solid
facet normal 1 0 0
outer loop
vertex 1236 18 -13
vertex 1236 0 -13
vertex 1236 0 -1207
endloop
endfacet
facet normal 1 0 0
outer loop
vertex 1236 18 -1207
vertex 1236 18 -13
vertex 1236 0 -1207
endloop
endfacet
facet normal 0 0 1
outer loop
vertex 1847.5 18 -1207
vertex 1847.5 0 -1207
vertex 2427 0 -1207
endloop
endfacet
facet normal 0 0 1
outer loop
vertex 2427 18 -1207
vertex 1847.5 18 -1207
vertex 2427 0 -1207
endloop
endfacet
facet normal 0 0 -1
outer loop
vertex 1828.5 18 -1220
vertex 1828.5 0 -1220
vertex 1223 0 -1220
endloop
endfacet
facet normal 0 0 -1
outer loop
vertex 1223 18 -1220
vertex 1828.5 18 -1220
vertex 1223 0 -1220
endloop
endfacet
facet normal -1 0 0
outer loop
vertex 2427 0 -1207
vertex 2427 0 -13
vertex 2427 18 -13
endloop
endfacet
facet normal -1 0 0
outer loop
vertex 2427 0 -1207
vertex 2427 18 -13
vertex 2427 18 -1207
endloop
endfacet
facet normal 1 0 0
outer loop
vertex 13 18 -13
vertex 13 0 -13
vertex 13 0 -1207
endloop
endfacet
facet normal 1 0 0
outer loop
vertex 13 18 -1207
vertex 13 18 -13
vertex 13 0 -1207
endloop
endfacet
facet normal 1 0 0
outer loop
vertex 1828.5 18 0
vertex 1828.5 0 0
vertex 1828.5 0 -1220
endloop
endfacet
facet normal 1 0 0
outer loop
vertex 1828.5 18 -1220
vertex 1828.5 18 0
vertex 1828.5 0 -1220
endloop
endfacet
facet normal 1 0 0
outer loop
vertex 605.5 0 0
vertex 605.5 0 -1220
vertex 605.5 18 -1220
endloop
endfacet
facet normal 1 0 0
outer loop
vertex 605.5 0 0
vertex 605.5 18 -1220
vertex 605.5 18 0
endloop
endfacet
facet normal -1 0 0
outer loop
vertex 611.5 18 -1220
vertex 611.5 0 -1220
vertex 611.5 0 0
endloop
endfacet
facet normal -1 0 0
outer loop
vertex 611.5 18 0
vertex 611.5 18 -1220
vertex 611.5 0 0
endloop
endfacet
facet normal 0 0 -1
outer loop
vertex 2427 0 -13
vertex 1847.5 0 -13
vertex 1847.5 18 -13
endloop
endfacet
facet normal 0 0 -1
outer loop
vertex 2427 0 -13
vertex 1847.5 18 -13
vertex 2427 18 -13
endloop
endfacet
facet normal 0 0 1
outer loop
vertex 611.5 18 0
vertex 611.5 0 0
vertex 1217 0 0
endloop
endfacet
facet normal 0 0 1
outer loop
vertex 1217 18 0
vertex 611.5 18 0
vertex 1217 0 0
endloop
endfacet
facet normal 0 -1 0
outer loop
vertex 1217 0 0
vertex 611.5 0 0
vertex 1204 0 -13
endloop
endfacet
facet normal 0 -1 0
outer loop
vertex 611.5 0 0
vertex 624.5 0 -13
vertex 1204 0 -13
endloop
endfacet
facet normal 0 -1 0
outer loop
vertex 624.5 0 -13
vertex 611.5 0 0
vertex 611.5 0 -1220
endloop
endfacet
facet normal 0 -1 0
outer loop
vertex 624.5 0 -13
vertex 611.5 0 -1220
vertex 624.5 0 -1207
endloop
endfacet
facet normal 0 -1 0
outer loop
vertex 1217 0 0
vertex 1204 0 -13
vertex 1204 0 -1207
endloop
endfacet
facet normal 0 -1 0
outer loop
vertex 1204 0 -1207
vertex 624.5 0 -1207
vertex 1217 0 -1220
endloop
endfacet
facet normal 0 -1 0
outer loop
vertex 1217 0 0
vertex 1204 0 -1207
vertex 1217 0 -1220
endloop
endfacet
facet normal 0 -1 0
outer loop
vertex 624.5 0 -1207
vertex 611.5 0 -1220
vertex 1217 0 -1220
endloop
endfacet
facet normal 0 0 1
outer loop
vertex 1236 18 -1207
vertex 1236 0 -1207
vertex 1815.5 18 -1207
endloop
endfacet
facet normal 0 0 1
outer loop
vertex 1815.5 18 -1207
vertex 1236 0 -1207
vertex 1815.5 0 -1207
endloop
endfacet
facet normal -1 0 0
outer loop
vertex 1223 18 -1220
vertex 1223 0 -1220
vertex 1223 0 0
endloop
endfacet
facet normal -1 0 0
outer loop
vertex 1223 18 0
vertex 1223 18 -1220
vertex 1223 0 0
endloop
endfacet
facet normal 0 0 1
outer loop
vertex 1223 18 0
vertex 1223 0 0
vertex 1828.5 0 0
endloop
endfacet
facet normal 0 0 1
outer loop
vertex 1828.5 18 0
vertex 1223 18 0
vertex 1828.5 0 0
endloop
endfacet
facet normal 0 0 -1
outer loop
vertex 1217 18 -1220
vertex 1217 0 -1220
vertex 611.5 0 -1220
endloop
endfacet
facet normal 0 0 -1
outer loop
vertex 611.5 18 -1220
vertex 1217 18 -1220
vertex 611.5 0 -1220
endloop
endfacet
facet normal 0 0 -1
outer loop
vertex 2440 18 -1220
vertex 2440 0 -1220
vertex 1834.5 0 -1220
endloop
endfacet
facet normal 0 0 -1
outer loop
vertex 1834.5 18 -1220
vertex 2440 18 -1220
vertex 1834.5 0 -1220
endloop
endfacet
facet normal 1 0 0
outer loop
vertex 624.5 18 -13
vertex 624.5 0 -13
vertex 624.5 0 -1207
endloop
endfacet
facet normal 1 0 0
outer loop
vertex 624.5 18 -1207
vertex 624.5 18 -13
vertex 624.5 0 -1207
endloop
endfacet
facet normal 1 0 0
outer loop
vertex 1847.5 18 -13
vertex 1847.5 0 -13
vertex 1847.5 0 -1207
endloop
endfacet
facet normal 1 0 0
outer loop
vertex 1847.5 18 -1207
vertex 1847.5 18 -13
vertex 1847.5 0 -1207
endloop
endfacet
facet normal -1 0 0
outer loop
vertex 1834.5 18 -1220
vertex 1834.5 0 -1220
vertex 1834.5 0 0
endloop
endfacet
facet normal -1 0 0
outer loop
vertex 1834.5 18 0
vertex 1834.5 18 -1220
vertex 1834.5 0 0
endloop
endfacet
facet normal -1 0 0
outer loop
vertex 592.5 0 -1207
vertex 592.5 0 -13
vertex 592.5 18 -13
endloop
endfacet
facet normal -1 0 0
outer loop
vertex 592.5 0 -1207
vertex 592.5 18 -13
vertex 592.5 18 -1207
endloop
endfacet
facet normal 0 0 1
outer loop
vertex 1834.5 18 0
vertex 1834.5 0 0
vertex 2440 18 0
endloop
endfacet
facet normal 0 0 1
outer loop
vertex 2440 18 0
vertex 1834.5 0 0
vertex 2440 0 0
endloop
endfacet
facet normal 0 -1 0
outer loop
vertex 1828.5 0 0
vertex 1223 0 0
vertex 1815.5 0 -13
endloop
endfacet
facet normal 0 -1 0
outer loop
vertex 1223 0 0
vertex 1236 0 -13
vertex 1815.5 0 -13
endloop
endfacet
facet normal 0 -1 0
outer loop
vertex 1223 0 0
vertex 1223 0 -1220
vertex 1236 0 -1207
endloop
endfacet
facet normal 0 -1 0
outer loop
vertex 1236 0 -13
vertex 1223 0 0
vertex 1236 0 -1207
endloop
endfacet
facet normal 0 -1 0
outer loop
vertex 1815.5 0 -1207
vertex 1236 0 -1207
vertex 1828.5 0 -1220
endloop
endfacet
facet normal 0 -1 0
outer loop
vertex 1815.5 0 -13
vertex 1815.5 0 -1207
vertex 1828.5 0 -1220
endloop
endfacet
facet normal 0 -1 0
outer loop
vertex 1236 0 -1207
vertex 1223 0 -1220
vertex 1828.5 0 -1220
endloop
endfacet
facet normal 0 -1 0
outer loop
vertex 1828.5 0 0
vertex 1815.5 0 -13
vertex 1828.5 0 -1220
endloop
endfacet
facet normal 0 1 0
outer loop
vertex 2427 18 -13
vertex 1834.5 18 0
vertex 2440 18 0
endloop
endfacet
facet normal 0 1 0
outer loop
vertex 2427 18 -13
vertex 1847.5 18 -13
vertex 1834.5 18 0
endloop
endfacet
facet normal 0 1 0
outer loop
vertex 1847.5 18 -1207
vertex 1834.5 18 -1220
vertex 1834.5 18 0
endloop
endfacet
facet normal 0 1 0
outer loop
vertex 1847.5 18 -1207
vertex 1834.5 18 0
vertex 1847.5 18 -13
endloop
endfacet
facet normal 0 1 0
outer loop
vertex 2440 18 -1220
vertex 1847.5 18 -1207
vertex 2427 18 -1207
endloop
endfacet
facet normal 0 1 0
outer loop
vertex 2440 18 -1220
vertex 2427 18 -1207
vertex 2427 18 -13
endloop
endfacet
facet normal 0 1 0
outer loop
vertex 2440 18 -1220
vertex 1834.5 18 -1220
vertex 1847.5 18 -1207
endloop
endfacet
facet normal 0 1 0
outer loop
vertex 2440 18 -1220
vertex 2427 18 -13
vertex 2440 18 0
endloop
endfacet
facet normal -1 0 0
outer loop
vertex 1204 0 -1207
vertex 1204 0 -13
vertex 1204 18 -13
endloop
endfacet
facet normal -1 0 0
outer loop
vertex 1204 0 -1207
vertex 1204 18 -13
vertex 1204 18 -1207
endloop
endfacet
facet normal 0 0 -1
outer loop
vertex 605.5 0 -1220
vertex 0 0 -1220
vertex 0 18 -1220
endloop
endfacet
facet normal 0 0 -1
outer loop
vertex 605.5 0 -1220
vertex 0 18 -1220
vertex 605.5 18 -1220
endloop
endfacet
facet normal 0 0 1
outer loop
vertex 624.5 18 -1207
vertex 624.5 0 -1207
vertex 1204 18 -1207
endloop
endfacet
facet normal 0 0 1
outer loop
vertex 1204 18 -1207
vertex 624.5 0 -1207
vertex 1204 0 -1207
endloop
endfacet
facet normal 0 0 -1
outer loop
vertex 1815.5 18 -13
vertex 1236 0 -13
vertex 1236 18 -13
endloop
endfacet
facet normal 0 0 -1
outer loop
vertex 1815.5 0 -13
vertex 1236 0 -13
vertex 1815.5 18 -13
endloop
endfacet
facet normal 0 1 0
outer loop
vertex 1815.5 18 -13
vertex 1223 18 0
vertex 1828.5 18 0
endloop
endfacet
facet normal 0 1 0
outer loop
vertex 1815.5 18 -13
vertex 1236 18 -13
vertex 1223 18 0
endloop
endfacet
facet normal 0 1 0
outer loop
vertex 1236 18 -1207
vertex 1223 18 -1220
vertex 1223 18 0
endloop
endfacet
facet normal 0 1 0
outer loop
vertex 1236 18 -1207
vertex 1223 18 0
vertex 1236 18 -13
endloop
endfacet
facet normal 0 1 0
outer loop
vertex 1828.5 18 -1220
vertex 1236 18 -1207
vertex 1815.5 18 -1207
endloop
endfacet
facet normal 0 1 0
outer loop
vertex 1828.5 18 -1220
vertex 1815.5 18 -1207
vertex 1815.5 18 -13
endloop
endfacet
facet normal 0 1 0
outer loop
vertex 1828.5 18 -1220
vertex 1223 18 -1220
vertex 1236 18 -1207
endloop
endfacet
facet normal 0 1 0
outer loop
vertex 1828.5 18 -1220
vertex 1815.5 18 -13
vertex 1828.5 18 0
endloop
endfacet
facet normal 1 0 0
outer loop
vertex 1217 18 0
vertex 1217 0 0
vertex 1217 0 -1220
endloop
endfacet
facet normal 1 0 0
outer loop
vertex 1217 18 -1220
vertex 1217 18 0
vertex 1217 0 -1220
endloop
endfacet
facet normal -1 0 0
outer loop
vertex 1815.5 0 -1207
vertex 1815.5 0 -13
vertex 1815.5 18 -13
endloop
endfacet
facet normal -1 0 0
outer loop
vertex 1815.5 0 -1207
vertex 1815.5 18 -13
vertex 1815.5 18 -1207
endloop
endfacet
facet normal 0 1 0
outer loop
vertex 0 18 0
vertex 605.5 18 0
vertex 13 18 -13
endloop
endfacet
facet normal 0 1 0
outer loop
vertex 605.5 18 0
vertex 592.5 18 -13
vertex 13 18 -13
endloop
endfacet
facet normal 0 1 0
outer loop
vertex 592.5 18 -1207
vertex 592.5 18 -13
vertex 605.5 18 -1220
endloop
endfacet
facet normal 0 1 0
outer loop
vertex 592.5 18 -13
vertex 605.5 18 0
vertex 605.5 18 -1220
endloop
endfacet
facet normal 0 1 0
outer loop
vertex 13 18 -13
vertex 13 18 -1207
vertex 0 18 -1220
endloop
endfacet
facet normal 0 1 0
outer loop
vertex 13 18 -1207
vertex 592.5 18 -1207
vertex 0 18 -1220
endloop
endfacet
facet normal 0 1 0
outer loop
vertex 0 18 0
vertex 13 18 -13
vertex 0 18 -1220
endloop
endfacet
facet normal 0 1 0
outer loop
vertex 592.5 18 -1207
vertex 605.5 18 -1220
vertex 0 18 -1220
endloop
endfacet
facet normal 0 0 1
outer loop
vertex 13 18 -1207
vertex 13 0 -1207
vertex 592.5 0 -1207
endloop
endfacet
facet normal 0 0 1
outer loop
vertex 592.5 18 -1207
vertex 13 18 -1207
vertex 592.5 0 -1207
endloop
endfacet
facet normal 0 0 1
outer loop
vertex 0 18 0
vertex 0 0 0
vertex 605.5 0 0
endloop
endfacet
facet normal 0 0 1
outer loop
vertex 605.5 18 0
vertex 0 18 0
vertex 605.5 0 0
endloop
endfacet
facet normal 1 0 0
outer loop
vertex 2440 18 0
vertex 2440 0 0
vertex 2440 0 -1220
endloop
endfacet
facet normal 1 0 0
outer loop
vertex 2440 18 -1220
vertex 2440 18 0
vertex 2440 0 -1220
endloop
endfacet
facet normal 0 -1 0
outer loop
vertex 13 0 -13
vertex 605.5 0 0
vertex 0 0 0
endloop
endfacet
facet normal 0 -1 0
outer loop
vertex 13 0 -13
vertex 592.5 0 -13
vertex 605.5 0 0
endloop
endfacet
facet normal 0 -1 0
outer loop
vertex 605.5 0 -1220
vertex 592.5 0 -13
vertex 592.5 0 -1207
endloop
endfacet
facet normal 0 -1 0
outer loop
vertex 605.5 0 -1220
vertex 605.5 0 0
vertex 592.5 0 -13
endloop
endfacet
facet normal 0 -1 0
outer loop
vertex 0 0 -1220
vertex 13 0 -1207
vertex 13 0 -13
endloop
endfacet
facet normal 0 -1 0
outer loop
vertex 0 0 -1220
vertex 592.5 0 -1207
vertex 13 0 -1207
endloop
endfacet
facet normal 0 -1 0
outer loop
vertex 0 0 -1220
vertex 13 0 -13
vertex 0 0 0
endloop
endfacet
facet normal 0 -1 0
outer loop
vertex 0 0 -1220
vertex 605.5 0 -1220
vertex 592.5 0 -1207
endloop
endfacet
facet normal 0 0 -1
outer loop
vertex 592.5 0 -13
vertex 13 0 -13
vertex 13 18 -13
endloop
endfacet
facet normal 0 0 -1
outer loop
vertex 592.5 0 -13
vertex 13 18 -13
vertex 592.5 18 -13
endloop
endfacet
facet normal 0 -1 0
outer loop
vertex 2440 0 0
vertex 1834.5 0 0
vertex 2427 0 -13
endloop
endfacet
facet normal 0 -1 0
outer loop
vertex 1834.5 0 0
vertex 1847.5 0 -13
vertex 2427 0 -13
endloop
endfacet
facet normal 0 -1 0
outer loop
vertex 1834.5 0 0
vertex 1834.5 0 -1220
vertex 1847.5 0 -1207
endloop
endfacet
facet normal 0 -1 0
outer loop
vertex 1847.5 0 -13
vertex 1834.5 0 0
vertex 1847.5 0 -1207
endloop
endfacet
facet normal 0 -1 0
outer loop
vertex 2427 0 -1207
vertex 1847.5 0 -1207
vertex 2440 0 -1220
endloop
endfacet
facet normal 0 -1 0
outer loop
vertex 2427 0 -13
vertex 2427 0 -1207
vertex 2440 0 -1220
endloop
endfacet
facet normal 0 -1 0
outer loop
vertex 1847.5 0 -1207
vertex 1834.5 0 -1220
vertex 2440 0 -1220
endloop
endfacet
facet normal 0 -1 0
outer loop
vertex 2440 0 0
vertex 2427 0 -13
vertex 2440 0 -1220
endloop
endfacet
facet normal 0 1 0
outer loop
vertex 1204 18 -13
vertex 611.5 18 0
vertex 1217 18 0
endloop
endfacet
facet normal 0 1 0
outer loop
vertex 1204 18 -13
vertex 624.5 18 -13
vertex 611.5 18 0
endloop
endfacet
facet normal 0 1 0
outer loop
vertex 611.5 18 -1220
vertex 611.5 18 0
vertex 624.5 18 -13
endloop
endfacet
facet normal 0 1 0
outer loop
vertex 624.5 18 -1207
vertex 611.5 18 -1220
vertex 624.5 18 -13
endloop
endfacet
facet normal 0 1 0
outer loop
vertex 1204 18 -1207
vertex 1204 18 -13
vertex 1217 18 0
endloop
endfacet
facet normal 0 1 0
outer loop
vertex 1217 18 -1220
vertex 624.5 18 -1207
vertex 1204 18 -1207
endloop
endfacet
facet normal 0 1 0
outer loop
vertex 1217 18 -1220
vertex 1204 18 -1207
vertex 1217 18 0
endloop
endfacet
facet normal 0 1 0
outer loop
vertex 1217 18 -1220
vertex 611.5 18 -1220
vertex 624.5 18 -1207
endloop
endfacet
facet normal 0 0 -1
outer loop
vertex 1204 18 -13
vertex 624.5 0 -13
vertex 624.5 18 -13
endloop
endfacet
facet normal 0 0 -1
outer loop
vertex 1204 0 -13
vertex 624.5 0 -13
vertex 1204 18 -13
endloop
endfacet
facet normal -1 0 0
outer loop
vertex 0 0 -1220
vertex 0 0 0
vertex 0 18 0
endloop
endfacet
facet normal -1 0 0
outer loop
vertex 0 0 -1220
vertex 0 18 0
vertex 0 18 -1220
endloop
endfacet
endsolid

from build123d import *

# Parameters (mm, degrees)
SKETCH1_W            = 579.5
SKETCH1_H            = 1194
BOSS_EXTRU_1_DEPTH   = 18
BOSS_EXTRU_1_2_DEPTH = 18
BOSS_EXTRU_1_3_DEPTH = 18
BOSS_EXTRU_1_4_DEPTH = 18


with BuildPart() as part:
    # Sketch1 → Boss.-Extru.1 (new body)
    with BuildSketch(Plane(origin=(0, 0, 0), x_dir=(1, 0, 0), z_dir=(0, 1, 0))):
        Polygon((0, 0), (0, 1220), (605.5, 1220), (605.5, 0), (592.5, 0), (13, 0), align=None)
        with Locations((302.75, 610)):
            Rectangle(SKETCH1_W, SKETCH1_H, mode=Mode.SUBTRACT)
    extrude(amount=BOSS_EXTRU_1_DEPTH)


with BuildPart() as body_2:
    # Sketch1 → Boss.-Extru.1 2 (new body)
    with BuildSketch(Plane(origin=(0, 0, 0), x_dir=(1, 0, 0), z_dir=(0, 1, 0))):
        Polygon((2440, 0), (2440, 1220), (1834.5, 1220), (1834.5, 0), (1847.5, 0), (2427, 0), align=None)
        with Locations((2137.25, 610)):
            Rectangle(SKETCH1_W, SKETCH1_H, mode=Mode.SUBTRACT)
    extrude(amount=BOSS_EXTRU_1_2_DEPTH)


with BuildPart() as body_3:
    # Sketch1 → Boss.-Extru.1 3 (new body)
    with BuildSketch(Plane(origin=(0, 0, 0), x_dir=(1, 0, 0), z_dir=(0, 1, 0))):
        Polygon((624.5, 0), (1204, 0), (1217, 0), (1217, 1220), (611.5, 1220), (611.5, 0), align=None)
        with Locations((914.25, 610)):
            Rectangle(SKETCH1_W, SKETCH1_H, mode=Mode.SUBTRACT)
    extrude(amount=BOSS_EXTRU_1_3_DEPTH)


with BuildPart() as body_4:
    # Sketch1 → Boss.-Extru.1 4 (new body)
    with BuildSketch(Plane(origin=(0, 0, 0), x_dir=(1, 0, 0), z_dir=(0, 1, 0))):
        Polygon((1236, 0), (1815.5, 0), (1828.5, 0), (1828.5, 1220), (1223, 1220), (1223, 0), align=None)
        with Locations((1525.75, 610)):
            Rectangle(SKETCH1_W, SKETCH1_H, mode=Mode.SUBTRACT)
    extrude(amount=BOSS_EXTRU_1_4_DEPTH)


solid = Compound([part.part, body_2.part, body_3.part, body_4.part])
